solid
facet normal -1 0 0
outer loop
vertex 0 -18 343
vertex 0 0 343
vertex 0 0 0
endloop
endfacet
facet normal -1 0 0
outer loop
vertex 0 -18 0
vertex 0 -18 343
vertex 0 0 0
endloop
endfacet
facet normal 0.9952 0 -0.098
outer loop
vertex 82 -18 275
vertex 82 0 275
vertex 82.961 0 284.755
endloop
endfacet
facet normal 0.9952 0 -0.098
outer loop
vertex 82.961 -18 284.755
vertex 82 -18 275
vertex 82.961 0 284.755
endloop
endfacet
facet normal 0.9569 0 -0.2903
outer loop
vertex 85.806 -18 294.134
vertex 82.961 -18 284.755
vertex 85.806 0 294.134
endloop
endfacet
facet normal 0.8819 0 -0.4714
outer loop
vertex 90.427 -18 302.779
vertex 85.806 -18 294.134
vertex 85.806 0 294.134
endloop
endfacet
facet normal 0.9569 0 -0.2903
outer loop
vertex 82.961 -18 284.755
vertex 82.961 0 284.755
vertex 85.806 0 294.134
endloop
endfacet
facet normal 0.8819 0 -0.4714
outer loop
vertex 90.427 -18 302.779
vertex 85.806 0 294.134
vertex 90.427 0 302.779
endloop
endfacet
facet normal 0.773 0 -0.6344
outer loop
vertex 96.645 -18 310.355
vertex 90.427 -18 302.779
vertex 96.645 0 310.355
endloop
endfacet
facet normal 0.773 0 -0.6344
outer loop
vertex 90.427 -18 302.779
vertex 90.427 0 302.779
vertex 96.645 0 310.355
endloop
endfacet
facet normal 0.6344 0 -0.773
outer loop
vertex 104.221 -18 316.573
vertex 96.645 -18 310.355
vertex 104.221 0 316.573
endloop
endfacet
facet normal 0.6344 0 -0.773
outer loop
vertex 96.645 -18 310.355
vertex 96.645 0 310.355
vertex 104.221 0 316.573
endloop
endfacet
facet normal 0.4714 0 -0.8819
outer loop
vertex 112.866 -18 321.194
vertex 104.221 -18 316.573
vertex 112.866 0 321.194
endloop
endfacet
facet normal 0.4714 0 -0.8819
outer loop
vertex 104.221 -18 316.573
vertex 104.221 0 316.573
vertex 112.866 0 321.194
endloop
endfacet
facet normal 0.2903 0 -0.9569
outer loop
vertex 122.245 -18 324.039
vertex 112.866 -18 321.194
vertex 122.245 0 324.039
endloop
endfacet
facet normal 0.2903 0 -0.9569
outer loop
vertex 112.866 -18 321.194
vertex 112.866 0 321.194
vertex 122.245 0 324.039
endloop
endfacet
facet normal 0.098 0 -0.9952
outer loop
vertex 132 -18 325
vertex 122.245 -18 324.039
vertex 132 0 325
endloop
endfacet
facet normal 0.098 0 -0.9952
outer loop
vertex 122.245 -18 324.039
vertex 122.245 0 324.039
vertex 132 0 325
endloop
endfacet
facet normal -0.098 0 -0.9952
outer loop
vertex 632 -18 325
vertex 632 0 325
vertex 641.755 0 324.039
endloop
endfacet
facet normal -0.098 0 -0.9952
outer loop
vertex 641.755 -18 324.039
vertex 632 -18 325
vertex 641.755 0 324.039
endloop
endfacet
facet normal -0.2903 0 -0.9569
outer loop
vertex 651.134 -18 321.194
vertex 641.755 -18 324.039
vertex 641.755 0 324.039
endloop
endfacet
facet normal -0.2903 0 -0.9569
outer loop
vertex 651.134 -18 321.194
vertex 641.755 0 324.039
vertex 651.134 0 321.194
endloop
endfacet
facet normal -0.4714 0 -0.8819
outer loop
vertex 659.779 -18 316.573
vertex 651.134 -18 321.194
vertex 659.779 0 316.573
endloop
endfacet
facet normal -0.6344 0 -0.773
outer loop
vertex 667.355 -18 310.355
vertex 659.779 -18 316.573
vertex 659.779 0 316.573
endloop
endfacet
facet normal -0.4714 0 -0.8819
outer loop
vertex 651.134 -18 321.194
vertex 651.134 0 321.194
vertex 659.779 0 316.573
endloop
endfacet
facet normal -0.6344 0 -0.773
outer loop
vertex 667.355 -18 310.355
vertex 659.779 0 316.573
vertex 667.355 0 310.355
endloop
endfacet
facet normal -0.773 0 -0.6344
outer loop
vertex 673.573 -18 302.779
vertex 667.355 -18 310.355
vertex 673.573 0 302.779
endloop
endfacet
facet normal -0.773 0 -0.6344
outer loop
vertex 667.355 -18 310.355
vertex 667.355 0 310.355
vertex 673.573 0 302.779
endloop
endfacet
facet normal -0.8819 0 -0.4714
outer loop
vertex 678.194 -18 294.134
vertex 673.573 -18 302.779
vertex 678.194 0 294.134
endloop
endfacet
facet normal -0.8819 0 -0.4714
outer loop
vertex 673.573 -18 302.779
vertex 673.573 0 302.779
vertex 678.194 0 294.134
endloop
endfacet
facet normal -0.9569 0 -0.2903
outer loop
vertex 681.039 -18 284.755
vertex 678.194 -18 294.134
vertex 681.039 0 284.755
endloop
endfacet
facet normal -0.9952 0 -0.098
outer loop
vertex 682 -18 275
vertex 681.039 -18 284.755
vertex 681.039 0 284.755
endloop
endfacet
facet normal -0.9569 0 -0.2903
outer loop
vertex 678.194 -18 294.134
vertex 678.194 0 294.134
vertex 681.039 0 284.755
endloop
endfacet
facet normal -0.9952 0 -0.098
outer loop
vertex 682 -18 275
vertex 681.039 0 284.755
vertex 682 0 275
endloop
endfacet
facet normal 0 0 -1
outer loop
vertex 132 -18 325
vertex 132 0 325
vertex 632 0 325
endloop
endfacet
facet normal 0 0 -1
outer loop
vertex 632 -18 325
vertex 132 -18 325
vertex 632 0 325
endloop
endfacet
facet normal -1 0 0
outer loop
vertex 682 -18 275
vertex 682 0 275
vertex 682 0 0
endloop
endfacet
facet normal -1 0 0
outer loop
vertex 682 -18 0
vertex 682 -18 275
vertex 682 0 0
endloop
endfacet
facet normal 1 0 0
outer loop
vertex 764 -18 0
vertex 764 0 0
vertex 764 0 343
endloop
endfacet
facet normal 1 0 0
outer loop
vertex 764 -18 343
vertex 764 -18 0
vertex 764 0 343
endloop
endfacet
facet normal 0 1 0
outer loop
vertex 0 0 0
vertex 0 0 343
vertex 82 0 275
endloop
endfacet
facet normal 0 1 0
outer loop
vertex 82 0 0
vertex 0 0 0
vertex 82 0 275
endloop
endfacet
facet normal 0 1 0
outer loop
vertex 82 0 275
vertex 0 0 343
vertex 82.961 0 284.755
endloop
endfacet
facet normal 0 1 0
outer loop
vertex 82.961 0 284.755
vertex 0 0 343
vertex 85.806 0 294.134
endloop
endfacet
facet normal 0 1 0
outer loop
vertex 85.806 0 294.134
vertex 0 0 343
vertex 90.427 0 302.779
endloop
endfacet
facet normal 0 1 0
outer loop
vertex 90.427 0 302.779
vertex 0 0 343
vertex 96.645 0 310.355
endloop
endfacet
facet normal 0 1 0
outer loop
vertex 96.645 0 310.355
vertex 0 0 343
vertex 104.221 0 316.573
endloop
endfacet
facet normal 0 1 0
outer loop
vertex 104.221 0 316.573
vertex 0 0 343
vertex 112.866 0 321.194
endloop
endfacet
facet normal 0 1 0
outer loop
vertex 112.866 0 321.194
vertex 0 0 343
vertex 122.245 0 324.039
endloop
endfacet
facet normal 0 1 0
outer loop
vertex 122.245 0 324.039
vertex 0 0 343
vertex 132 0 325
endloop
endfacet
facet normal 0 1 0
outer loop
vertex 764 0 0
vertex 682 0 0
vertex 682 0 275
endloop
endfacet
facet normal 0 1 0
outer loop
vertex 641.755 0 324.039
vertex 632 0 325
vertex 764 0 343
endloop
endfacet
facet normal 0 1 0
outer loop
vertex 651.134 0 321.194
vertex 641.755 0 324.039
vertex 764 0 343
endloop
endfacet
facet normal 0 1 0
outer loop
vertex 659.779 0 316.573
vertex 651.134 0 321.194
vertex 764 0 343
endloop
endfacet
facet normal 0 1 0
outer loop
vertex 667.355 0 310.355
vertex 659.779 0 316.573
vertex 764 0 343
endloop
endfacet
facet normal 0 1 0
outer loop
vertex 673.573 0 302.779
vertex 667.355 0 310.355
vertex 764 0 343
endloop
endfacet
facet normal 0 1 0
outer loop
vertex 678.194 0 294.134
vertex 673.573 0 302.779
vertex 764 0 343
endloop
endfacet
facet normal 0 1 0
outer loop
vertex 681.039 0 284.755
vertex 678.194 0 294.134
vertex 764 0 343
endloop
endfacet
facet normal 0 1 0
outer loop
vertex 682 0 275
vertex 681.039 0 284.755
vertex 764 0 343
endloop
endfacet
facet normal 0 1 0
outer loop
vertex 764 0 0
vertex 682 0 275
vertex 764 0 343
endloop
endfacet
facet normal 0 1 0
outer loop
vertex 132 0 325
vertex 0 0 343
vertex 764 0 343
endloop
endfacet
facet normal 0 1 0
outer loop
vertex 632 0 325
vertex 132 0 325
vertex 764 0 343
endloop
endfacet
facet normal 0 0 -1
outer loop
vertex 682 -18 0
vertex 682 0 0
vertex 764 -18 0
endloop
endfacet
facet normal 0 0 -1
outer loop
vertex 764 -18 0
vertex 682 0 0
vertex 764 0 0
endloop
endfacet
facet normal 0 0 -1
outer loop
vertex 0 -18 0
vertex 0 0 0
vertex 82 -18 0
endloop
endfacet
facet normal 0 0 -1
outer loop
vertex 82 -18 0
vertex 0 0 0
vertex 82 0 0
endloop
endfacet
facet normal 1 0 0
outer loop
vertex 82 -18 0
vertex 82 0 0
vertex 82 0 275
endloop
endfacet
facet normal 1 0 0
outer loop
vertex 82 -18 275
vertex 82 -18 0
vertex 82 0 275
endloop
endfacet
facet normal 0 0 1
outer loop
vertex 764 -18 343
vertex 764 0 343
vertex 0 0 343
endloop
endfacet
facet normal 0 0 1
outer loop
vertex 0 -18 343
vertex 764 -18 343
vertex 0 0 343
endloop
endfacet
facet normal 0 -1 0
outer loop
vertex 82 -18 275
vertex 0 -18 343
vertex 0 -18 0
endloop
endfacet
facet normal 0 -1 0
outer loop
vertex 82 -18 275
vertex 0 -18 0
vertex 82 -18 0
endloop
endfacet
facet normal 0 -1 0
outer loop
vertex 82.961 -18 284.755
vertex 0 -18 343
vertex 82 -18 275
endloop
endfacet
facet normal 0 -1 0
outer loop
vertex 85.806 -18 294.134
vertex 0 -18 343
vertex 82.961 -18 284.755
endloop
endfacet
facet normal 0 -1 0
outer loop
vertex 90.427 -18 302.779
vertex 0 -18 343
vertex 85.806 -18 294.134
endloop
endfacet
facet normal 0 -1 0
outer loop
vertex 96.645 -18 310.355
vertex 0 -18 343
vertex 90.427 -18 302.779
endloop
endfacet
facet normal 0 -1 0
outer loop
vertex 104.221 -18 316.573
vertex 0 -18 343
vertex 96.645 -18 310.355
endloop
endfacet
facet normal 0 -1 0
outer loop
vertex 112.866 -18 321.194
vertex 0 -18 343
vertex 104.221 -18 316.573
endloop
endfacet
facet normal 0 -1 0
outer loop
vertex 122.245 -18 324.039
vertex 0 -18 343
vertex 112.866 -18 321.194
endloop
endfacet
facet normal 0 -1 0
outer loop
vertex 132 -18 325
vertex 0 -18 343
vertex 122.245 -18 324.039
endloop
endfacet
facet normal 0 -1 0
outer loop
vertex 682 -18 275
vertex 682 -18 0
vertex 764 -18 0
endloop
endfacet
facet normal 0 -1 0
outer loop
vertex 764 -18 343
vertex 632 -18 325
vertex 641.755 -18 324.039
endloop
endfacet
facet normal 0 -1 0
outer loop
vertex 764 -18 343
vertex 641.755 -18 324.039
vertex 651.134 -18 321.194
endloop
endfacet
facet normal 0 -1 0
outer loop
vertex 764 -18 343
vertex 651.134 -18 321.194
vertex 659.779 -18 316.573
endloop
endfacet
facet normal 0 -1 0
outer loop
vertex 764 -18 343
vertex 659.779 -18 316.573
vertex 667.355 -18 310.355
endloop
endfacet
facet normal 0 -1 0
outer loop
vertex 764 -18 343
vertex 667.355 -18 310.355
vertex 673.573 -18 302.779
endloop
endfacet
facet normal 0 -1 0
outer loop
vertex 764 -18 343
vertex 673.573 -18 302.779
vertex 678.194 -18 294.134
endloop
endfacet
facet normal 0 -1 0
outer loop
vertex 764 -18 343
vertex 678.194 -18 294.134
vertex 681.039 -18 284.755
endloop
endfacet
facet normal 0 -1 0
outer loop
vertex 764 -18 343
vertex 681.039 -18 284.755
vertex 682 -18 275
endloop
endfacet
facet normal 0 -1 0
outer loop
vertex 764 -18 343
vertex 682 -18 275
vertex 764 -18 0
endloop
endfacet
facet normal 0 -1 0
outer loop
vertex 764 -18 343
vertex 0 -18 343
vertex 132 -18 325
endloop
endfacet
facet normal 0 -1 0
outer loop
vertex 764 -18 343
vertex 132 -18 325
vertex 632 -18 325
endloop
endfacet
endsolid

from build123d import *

# Parameters (mm, degrees)
F1_DEPTH = 18


with BuildPart() as f1:
    # F0 (on Front) → F1 (new body)
    with BuildSketch(Plane.XZ):
        with BuildLine():
            Line((0, 343), (0, 0))
            Line((0, 0), (82, 0))
            Line((82, 0), (82, 275))
            ThreePointArc((82, 275), (96.644661, 310.355339), (132, 325))
            Line((132, 325), (632, 325))
            ThreePointArc((632, 325), (667.355339, 310.355339), (682, 275))
            Line((682, 275), (682, 0))
            Line((682, 0), (764, 0))
            Line((764, 0), (764, 343))
            Line((764, 343), (0, 343))
        make_face()
    extrude(amount=F1_DEPTH)


solid = f1.part
